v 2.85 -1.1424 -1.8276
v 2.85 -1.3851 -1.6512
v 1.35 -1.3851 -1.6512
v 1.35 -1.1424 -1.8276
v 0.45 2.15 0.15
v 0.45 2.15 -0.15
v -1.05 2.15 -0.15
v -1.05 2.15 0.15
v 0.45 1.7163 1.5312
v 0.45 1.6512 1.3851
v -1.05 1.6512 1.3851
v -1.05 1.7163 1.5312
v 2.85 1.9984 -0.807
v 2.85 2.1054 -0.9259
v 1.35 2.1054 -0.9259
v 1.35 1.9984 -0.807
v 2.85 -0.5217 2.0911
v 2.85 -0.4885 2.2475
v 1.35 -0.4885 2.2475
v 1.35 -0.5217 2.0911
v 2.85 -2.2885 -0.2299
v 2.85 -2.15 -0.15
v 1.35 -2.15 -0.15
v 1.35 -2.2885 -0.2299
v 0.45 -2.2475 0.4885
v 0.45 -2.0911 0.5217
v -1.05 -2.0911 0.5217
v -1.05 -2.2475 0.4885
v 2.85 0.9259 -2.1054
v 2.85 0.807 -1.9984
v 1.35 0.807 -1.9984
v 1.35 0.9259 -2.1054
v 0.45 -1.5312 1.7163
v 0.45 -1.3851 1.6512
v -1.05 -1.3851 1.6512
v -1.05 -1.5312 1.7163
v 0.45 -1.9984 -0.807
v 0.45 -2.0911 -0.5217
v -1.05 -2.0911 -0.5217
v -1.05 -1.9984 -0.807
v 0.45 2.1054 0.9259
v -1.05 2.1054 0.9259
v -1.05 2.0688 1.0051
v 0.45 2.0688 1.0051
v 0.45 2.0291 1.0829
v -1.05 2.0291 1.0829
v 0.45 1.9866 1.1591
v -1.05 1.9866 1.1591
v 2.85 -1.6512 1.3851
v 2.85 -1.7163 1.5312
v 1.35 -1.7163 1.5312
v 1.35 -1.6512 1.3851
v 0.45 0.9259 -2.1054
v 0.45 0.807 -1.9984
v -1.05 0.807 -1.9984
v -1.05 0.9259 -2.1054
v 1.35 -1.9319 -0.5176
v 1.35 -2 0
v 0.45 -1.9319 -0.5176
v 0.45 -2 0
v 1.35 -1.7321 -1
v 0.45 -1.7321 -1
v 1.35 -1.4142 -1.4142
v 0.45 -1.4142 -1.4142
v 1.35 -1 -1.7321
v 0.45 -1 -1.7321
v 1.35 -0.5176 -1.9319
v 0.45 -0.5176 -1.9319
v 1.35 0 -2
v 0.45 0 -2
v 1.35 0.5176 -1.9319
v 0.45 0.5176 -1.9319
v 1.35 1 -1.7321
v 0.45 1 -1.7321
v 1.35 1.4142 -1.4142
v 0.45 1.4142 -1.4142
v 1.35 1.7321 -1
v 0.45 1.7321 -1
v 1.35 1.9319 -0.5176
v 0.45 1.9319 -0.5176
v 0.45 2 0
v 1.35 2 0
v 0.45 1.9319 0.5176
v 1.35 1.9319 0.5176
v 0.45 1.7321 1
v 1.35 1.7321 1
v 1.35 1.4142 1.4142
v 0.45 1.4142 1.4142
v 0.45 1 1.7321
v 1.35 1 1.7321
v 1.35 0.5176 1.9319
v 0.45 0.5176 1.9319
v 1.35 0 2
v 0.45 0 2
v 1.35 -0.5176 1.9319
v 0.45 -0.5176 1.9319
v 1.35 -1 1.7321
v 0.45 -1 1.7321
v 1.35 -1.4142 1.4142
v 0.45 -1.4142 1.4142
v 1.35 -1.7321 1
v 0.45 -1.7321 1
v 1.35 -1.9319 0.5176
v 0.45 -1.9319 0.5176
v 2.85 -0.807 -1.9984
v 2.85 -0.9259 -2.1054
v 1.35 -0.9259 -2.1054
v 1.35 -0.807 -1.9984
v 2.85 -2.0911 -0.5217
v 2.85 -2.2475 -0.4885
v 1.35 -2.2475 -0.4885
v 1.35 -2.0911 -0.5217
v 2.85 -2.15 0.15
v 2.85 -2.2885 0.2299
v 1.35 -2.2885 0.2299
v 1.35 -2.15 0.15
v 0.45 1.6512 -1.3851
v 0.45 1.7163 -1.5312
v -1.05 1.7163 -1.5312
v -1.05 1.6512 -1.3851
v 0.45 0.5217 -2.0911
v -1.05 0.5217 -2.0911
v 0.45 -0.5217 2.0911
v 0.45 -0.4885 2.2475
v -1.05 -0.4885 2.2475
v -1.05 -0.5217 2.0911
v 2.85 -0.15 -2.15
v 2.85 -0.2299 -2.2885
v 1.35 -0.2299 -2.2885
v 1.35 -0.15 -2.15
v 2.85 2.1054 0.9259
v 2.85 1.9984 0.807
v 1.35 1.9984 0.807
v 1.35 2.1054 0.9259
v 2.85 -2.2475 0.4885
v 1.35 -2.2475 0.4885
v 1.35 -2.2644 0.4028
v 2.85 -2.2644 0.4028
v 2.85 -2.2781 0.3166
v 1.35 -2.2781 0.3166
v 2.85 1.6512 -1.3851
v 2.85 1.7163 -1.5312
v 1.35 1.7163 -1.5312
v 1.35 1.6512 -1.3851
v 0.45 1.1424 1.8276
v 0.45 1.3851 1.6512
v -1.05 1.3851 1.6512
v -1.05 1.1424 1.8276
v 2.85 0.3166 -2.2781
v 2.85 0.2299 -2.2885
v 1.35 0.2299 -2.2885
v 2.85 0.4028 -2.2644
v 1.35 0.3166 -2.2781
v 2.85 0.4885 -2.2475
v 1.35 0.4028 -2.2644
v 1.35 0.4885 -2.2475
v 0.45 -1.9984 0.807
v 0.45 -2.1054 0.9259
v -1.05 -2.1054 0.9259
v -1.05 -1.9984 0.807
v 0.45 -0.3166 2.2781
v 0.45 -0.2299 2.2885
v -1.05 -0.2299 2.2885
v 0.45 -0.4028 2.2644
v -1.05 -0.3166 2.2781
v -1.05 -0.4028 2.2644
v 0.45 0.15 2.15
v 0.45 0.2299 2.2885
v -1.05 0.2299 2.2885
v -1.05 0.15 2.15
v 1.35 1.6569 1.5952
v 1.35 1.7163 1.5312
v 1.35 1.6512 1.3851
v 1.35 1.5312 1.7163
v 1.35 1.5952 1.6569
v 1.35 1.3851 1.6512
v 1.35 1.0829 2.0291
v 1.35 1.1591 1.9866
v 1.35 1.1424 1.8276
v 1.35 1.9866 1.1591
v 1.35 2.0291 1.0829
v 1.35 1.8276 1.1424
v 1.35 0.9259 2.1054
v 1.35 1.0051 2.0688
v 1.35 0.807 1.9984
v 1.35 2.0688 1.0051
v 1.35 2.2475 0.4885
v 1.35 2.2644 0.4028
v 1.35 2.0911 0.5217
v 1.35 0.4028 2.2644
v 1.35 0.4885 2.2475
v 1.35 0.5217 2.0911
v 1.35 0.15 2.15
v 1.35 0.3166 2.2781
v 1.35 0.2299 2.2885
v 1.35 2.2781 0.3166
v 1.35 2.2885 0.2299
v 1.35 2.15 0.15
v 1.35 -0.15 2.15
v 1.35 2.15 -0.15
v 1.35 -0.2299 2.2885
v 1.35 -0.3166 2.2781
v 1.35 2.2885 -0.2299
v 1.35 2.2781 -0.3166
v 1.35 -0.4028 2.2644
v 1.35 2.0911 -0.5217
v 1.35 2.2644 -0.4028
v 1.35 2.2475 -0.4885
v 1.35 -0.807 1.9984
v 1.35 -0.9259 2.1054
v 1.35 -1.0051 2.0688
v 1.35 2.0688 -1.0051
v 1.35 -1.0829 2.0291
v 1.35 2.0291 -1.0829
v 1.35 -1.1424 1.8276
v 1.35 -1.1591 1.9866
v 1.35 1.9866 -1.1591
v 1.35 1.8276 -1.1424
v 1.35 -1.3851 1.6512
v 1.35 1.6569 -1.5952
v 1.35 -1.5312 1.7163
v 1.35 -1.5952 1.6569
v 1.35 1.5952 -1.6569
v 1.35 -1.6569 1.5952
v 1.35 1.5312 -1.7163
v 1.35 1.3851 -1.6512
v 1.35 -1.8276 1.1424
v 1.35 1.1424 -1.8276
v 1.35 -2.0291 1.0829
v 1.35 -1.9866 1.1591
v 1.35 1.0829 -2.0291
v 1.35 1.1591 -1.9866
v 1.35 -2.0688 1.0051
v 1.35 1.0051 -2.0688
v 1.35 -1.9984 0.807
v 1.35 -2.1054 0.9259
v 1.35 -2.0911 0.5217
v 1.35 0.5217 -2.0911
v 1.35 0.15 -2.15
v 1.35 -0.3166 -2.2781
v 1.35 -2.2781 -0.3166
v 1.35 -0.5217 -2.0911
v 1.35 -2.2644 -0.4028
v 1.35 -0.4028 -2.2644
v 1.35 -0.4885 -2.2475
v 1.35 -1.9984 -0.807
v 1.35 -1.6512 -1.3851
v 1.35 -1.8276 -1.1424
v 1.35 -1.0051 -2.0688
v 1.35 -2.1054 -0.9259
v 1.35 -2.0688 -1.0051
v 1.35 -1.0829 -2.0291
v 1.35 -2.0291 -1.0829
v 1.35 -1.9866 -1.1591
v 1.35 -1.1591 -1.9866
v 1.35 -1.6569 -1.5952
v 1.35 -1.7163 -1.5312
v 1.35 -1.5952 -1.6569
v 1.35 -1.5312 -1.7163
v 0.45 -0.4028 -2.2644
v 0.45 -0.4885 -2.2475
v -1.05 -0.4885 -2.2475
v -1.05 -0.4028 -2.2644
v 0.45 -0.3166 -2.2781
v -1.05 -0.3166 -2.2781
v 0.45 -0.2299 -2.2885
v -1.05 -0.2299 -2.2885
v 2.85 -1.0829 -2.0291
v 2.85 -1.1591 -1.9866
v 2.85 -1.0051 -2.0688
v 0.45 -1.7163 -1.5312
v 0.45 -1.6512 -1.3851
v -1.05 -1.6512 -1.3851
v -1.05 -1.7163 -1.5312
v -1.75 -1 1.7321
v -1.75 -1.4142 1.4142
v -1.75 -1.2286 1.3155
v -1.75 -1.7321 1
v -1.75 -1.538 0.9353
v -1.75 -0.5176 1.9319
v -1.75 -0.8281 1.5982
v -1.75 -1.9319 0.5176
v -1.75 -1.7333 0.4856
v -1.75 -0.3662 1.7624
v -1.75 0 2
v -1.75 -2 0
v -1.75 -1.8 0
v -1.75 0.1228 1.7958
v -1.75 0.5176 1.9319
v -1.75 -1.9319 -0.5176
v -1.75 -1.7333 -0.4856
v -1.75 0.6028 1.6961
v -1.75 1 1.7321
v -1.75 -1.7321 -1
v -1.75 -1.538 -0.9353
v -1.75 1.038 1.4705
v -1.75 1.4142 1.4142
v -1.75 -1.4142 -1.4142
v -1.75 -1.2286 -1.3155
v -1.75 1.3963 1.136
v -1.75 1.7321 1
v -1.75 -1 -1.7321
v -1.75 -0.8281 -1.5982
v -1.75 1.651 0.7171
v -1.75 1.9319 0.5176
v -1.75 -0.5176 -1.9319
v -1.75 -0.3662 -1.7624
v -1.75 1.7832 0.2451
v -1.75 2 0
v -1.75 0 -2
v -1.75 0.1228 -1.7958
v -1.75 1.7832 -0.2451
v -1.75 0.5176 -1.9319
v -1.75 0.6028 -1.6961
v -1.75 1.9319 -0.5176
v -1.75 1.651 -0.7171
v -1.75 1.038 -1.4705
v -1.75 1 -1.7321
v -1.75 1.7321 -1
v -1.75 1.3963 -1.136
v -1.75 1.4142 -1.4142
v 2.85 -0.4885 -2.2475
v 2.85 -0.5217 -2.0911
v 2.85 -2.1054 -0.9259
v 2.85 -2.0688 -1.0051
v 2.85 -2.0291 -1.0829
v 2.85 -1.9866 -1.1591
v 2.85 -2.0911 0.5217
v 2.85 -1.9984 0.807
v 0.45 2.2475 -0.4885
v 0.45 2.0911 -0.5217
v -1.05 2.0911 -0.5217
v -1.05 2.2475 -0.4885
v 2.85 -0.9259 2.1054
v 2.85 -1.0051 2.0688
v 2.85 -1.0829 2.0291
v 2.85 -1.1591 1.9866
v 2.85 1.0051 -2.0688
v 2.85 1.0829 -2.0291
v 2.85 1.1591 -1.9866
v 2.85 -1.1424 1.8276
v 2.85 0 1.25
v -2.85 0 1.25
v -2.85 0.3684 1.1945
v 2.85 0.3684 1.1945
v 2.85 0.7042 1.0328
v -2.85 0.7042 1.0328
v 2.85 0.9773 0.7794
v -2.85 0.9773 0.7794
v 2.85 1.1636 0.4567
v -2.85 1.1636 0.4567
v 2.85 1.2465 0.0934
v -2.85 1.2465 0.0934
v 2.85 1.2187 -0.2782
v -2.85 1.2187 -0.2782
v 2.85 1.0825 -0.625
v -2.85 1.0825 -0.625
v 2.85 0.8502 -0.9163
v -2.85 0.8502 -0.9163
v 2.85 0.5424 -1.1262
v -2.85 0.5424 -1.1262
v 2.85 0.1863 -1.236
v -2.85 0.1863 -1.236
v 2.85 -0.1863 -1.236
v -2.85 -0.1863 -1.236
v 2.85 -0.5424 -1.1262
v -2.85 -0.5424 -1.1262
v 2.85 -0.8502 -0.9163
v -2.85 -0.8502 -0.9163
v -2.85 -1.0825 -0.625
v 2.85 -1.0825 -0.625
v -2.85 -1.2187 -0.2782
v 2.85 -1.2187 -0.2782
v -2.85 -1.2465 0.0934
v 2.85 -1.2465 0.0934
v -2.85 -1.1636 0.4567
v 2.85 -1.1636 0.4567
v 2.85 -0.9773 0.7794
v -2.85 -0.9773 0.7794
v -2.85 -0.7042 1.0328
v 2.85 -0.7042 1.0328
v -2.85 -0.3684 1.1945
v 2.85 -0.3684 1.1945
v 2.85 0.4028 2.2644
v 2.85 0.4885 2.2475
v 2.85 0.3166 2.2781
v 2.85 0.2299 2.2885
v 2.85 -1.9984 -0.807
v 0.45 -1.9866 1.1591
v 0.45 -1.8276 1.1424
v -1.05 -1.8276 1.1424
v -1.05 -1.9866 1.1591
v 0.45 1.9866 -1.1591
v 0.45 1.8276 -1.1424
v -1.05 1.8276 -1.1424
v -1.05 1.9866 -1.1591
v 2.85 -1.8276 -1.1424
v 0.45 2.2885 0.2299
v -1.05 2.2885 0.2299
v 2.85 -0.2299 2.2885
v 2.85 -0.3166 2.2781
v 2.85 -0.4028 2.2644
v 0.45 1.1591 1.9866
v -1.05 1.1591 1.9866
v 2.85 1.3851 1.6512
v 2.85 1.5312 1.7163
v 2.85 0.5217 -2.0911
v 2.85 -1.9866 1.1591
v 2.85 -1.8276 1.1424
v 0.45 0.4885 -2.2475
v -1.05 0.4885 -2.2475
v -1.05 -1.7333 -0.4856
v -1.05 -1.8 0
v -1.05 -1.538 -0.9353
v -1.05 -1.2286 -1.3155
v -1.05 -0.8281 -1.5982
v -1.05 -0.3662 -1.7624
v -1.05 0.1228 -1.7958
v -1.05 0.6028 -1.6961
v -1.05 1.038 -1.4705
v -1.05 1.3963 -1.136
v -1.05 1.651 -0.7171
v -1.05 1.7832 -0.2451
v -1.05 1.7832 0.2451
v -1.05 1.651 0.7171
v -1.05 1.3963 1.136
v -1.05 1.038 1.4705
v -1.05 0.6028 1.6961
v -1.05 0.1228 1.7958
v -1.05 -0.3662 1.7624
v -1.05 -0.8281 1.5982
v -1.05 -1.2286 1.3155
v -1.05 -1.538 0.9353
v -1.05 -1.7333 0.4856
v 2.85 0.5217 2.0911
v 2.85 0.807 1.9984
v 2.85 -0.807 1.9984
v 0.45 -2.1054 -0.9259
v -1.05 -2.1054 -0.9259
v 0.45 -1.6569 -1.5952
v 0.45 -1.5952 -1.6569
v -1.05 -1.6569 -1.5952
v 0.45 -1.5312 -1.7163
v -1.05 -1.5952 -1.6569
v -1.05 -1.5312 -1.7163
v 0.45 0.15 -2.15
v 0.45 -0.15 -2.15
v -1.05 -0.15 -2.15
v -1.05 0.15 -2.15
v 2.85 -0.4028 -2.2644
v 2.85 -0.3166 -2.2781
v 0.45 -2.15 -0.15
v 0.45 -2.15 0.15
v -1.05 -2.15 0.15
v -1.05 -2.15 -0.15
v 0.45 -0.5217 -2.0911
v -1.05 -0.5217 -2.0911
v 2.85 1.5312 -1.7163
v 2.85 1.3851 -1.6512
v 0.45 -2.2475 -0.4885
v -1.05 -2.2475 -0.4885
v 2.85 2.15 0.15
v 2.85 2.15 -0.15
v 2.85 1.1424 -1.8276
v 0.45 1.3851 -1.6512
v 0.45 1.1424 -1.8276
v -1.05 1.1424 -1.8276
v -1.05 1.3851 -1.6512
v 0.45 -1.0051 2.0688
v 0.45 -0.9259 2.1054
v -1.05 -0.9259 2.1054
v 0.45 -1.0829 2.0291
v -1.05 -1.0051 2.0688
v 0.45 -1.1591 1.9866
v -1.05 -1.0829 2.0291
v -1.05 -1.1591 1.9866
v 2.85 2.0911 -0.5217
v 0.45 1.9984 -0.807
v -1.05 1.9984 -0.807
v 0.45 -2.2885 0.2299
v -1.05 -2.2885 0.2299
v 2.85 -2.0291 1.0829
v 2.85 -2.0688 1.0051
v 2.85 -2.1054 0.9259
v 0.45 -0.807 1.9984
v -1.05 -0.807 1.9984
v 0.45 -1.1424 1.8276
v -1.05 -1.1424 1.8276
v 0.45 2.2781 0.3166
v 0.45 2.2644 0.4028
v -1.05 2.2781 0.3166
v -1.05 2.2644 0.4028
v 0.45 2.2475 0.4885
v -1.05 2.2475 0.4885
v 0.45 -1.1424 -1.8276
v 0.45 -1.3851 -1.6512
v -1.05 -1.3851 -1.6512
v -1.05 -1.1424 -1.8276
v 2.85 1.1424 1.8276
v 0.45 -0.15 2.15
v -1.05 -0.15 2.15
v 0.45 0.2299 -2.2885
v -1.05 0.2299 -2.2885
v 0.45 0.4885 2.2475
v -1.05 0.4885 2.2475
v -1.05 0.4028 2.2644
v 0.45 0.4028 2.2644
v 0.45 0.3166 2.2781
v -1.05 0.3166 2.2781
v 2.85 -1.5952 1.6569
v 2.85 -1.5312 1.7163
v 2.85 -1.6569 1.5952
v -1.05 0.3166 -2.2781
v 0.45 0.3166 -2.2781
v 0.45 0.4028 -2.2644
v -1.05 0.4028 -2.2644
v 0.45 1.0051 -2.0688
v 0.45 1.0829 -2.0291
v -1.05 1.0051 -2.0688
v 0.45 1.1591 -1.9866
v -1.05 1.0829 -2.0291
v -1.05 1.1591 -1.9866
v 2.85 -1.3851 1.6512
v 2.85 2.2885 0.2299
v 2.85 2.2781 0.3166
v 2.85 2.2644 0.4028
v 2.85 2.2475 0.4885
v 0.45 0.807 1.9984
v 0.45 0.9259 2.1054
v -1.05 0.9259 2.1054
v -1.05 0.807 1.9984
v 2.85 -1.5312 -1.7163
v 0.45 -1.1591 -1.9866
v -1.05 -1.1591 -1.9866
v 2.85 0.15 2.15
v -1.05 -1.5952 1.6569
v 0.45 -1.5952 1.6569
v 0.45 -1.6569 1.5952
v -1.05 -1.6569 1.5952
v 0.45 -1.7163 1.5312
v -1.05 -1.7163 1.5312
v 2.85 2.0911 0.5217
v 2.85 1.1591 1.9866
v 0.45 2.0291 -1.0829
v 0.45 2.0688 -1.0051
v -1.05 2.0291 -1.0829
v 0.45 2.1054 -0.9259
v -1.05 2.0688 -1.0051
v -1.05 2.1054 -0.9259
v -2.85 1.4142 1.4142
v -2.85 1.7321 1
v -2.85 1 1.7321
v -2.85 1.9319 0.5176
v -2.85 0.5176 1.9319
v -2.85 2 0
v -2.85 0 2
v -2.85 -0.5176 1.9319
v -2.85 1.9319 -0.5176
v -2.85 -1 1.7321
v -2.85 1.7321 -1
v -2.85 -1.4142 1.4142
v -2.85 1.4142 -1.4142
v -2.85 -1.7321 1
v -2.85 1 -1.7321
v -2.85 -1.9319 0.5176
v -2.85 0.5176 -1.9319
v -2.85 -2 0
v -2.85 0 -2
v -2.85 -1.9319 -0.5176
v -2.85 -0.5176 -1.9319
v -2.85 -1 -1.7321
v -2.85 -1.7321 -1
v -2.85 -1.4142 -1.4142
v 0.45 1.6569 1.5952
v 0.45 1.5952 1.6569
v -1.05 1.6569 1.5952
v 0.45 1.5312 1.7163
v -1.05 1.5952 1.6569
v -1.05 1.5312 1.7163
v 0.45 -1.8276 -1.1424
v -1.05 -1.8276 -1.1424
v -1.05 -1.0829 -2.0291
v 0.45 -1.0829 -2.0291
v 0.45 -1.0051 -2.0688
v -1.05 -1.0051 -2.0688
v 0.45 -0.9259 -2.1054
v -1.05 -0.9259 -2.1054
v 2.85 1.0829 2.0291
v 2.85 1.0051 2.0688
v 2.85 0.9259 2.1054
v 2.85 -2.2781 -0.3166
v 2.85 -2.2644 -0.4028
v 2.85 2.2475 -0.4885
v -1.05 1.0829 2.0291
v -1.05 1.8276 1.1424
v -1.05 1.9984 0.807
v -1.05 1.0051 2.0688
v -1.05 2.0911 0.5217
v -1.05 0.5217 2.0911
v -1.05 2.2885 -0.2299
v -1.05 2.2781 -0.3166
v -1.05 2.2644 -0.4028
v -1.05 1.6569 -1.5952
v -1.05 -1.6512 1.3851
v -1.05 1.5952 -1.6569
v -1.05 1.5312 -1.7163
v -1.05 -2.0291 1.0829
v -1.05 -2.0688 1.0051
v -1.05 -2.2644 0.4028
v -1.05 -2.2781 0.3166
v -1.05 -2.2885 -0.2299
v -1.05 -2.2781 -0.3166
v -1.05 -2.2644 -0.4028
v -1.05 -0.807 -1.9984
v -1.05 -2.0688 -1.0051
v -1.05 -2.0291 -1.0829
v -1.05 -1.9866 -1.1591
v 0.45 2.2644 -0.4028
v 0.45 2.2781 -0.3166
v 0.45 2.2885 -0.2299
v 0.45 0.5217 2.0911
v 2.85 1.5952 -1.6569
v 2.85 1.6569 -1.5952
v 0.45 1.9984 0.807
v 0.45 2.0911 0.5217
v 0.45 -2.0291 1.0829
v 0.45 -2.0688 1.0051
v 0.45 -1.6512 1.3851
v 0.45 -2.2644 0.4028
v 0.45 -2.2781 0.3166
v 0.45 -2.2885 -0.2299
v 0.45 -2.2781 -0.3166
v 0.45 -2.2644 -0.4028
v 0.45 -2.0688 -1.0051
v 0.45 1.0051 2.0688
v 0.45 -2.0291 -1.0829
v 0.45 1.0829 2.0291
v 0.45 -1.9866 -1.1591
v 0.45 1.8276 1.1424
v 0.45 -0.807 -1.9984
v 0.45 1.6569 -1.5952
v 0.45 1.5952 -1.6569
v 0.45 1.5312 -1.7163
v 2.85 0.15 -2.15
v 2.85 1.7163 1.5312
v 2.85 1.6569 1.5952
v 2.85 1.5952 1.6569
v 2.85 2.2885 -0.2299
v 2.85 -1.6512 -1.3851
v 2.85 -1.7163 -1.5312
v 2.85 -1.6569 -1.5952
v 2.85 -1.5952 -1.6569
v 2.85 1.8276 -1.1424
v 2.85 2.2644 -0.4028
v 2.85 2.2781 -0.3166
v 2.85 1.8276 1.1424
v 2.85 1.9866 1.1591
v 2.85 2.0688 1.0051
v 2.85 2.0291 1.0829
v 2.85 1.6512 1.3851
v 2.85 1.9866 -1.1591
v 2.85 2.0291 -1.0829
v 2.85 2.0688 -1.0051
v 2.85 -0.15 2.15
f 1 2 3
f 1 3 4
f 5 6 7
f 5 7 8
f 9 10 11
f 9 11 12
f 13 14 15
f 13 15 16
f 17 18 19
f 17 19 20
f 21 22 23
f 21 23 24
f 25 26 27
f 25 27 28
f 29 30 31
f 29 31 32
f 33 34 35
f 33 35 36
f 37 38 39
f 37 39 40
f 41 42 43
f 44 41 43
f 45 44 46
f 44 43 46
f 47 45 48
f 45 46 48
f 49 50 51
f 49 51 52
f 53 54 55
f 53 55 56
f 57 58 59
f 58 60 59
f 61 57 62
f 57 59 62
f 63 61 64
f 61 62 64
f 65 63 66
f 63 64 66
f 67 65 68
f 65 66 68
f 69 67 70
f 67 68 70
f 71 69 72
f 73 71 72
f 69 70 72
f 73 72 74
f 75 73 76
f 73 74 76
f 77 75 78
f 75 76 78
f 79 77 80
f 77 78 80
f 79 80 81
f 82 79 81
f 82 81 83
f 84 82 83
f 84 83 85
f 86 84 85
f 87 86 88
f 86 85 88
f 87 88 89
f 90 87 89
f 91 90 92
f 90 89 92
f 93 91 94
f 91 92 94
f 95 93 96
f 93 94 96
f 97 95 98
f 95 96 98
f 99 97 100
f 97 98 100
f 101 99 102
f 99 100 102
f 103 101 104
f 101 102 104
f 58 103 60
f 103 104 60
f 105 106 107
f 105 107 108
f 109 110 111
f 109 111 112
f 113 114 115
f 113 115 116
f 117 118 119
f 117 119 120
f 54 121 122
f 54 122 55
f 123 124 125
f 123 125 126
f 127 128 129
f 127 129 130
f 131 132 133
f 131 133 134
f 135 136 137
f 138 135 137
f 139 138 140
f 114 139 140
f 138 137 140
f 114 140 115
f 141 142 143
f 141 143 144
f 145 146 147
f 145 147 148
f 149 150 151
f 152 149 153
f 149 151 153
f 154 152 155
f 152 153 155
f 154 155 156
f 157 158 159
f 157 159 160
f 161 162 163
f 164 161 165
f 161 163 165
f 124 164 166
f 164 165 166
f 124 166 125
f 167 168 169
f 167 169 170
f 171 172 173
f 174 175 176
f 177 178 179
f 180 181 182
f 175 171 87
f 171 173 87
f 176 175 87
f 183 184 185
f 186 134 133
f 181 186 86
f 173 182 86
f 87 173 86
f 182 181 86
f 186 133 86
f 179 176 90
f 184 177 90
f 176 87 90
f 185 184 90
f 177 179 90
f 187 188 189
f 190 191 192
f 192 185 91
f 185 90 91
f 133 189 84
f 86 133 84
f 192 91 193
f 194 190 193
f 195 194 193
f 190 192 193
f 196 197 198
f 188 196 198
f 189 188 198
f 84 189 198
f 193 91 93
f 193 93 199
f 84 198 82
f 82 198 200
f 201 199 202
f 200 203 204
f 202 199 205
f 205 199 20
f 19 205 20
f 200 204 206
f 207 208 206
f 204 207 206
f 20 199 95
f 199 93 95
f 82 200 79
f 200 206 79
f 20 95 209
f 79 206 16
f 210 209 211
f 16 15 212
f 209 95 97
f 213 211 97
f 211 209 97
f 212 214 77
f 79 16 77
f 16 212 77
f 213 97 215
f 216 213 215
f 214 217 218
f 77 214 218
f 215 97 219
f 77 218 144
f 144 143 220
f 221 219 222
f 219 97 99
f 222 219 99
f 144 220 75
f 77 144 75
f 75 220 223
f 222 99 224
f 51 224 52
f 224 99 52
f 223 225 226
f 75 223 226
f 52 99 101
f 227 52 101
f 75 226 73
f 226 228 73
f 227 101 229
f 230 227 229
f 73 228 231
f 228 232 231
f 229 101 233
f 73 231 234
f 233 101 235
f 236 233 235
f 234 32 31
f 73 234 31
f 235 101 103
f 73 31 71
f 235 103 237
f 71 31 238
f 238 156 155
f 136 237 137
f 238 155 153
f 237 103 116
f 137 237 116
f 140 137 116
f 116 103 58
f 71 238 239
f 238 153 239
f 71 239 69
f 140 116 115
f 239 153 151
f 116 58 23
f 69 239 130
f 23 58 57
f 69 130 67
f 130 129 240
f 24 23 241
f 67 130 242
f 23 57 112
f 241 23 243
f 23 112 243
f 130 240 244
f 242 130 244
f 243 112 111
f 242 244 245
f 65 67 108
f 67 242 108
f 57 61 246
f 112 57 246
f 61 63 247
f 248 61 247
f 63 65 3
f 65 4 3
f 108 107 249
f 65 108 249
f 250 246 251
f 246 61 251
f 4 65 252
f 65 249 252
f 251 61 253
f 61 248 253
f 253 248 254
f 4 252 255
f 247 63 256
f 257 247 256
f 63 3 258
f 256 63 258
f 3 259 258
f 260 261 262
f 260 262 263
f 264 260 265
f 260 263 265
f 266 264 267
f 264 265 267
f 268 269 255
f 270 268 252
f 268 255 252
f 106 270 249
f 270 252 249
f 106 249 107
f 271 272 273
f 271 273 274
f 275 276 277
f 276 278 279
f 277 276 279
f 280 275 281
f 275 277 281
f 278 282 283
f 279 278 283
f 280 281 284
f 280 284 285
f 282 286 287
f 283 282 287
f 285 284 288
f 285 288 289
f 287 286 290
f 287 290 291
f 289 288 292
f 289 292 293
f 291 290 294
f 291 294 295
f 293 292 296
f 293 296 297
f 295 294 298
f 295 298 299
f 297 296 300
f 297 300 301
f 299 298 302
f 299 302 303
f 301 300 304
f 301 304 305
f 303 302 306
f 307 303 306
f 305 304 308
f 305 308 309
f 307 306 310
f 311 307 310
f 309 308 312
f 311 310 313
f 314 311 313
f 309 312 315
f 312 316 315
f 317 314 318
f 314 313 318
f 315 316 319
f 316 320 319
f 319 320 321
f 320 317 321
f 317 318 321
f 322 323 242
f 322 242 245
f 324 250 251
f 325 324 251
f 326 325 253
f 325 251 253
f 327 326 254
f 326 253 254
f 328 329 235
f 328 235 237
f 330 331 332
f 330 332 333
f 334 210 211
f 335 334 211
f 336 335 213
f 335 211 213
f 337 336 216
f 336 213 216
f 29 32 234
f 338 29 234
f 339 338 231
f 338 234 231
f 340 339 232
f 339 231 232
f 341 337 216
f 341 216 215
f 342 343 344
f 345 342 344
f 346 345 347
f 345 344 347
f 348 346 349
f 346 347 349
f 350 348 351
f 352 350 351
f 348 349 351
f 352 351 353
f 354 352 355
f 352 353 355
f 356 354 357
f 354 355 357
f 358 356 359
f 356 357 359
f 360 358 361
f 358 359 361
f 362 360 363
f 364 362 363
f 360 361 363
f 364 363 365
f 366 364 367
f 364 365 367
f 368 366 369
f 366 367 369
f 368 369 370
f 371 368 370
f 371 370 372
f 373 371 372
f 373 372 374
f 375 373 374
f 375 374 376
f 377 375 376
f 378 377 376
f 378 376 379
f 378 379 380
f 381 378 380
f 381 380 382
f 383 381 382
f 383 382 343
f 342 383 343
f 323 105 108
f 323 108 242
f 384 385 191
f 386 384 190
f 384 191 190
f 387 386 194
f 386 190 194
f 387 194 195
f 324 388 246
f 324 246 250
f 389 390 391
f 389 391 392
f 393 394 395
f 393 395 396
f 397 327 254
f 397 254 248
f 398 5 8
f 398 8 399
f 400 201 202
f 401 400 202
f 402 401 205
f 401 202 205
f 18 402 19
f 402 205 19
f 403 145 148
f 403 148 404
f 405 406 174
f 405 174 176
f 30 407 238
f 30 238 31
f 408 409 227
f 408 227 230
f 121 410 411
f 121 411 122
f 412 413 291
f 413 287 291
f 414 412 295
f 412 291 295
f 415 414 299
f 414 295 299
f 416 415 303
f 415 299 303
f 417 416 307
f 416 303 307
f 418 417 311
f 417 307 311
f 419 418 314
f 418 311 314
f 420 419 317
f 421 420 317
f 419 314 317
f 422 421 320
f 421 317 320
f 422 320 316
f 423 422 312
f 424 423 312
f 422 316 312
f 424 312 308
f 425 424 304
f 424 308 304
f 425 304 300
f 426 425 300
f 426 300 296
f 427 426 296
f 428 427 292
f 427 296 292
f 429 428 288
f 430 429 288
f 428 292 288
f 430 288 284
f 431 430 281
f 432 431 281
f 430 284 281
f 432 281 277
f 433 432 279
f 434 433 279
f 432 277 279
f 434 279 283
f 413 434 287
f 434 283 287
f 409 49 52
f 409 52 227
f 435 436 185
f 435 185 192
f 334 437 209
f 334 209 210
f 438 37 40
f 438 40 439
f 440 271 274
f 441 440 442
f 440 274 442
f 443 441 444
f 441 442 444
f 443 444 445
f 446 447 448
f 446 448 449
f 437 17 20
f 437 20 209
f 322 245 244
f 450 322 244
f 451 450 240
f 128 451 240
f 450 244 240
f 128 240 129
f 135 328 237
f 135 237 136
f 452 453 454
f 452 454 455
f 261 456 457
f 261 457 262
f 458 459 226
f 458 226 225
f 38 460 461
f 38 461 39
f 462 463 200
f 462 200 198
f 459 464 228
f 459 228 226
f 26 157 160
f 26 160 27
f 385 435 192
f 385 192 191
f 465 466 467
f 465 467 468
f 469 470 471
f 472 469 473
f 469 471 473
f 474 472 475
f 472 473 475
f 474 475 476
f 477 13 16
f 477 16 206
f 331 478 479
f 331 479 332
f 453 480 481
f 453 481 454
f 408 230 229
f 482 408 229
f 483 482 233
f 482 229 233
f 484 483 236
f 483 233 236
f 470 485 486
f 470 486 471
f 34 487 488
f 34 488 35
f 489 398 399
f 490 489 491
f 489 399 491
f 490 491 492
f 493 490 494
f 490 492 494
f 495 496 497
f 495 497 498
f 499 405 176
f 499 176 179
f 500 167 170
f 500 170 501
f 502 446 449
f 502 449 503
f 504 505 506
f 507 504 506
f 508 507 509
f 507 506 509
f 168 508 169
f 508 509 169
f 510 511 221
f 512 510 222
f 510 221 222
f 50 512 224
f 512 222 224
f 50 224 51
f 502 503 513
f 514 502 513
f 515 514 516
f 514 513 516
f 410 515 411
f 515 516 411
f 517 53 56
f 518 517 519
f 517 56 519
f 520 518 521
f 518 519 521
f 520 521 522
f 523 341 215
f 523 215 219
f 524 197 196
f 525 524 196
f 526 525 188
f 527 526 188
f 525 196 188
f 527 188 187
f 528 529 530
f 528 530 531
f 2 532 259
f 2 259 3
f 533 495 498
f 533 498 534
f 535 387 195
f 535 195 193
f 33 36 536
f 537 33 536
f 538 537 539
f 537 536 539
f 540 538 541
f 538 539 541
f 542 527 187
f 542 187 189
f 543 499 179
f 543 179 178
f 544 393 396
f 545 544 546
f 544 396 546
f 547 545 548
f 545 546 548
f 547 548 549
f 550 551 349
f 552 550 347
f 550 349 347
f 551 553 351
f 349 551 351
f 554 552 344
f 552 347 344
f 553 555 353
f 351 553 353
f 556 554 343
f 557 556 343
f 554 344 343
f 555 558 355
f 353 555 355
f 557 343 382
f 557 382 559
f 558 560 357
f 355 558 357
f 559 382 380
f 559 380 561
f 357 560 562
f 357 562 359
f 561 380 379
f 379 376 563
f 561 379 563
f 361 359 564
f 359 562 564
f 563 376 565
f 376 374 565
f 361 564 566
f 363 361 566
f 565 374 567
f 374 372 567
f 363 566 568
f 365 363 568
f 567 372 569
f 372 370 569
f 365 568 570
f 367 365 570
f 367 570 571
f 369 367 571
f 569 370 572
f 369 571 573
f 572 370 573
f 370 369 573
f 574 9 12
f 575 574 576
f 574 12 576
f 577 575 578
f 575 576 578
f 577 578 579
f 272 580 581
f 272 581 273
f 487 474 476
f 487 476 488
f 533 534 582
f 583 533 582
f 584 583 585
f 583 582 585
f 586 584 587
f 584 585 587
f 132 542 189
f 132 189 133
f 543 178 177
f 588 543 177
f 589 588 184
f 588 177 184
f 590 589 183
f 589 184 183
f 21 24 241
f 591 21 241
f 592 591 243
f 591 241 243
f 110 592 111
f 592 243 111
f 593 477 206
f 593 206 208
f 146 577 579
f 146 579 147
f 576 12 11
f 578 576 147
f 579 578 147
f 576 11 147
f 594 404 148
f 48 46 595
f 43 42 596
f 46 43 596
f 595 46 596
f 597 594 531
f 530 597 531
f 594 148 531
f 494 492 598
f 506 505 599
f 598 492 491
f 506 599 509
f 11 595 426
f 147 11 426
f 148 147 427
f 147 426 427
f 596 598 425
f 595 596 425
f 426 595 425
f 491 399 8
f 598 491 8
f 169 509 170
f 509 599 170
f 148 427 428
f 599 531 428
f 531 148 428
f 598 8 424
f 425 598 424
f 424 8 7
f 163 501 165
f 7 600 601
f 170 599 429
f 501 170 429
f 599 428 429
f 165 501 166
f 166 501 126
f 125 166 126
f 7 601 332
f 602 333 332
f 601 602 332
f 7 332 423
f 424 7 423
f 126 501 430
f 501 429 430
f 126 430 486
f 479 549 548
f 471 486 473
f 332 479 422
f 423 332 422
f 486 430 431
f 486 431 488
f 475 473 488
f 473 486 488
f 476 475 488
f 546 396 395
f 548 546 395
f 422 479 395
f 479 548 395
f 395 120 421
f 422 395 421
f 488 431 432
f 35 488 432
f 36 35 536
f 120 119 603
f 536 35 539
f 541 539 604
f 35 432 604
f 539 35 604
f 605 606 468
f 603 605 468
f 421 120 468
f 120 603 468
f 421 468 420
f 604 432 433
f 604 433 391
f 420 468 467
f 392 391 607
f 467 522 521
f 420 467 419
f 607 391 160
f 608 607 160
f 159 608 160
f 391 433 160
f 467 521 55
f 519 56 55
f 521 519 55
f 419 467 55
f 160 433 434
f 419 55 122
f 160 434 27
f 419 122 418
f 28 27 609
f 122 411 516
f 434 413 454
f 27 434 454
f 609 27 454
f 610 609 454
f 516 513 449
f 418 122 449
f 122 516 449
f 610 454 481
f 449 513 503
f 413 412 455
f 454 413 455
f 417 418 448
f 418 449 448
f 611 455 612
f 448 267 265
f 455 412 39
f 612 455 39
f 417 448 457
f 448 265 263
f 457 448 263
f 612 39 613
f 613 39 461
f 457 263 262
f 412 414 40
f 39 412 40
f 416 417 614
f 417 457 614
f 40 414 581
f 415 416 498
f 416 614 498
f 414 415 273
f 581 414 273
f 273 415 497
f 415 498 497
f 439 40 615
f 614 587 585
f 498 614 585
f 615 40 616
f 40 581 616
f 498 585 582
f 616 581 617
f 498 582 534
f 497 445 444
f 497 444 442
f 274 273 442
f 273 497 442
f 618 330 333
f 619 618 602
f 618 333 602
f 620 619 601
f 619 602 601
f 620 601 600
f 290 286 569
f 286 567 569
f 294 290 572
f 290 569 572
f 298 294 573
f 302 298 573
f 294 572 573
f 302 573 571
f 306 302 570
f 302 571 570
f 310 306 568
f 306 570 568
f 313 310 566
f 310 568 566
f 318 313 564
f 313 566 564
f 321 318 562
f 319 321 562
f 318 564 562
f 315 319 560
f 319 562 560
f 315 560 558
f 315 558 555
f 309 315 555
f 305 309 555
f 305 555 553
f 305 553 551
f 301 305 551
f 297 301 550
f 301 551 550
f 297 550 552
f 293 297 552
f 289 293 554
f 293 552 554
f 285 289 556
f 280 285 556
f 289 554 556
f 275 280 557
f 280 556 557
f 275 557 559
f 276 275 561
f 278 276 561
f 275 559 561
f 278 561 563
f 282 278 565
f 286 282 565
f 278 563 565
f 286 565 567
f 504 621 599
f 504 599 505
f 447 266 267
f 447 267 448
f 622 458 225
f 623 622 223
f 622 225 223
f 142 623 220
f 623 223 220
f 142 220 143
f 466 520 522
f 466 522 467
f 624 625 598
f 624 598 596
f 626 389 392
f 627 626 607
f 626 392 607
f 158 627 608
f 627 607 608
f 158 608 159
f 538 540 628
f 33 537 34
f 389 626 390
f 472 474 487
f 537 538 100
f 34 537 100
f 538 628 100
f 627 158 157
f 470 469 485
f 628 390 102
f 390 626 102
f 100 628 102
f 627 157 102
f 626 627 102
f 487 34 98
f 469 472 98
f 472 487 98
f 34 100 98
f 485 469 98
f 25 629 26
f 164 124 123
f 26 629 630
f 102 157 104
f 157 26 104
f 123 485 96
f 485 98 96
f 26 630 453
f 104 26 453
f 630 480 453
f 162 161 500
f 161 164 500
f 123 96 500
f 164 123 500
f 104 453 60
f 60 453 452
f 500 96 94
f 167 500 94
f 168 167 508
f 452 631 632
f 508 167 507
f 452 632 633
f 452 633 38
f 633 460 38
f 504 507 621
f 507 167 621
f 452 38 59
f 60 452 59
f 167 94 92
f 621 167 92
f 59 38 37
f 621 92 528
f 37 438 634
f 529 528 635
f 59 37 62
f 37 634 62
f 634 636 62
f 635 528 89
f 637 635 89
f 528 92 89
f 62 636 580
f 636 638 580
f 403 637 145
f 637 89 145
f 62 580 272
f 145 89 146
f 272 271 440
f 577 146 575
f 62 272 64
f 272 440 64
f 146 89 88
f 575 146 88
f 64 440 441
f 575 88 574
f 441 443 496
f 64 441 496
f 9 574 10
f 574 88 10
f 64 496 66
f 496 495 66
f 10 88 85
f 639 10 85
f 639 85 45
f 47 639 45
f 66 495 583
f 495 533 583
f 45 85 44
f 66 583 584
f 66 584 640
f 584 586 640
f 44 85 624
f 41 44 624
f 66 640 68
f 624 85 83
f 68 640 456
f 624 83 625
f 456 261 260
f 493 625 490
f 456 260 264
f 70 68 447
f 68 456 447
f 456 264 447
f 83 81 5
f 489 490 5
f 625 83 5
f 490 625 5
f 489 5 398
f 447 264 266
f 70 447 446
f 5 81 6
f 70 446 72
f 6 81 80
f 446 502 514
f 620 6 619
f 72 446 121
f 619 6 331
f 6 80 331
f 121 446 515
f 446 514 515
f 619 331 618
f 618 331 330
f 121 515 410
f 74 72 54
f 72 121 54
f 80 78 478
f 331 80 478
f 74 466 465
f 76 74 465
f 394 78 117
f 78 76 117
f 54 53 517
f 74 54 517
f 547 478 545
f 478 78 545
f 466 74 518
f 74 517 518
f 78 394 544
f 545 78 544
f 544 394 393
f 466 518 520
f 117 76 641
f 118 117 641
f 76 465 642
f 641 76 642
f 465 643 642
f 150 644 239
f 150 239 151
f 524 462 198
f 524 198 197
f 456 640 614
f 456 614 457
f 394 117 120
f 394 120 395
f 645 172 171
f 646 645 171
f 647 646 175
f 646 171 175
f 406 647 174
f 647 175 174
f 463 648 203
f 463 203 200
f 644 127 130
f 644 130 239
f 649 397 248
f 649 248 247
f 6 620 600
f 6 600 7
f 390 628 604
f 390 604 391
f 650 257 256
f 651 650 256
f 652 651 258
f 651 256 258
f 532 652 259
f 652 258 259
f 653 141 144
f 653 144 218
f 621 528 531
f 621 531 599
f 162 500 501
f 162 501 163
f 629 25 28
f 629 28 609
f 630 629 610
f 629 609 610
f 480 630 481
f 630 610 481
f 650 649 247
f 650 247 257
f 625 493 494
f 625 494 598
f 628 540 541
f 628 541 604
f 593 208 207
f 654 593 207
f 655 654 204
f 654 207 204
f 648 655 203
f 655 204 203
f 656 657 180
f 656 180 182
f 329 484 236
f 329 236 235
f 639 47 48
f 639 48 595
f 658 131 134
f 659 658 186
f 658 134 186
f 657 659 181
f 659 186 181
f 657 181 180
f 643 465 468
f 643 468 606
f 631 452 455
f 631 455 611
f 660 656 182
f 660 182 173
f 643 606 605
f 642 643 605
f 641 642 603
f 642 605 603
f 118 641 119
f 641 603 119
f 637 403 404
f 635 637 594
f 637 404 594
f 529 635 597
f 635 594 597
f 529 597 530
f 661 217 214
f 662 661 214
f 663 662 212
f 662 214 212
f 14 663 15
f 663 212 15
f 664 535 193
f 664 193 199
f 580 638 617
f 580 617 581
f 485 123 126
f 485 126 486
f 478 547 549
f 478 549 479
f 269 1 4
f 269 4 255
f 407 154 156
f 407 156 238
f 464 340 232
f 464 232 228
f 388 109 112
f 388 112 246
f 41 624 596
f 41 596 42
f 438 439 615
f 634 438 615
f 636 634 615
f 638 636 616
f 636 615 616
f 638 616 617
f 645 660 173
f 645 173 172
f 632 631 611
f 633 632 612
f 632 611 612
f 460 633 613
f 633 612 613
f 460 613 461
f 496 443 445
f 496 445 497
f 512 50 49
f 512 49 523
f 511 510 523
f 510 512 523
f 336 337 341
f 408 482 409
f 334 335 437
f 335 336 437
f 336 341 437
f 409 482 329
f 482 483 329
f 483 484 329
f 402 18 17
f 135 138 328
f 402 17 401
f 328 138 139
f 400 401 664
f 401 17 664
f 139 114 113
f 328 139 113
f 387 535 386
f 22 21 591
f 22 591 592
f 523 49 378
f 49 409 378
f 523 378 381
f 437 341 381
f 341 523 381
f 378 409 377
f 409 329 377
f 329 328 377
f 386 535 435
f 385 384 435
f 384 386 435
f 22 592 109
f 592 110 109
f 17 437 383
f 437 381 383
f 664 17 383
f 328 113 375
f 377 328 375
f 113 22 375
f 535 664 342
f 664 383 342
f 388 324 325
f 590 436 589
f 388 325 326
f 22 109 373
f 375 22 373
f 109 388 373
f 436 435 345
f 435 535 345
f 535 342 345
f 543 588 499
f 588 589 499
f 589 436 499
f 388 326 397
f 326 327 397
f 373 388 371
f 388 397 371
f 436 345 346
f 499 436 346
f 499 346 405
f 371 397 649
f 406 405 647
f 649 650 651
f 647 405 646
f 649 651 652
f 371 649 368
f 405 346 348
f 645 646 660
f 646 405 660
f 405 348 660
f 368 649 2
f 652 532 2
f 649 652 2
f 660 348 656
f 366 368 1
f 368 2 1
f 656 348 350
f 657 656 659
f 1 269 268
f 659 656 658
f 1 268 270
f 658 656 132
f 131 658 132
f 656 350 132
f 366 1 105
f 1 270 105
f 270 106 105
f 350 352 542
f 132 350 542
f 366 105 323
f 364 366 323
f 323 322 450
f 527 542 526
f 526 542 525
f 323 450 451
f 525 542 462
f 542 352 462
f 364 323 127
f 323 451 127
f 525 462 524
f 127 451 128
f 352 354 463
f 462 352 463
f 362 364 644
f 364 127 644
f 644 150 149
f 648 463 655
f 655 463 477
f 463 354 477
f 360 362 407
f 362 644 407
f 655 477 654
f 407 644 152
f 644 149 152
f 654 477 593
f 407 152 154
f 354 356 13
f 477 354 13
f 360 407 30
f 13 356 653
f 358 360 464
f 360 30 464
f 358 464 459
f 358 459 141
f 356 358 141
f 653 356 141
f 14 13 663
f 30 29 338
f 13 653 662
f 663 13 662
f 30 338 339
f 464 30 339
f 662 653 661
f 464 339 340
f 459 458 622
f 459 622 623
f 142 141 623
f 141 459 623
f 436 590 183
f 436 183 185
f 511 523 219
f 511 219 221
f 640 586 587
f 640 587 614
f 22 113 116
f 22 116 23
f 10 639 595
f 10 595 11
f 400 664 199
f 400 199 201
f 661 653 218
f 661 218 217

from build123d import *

# Parameters (mm, degrees)
M3X0_5_TAPPED_HOLE1_D = 2.5
CUT_EXTRUDE1_REACH    = 8.563
CIRPATTERN1_COUNT     = 20


with BuildPart() as part:
    # Sketch1 → Revolve1 (revolve)
    with BuildSketch(Plane.XY, mode=Mode.PRIVATE) as revolve1_sk:
        Polygon((-2.85, 0), (2.85, 0), (2.85, 2.3), (1.35, 2.3), (1.35, 2), (0.45, 2), (0.45, 2.3), (-1.05, 2.3), (-1.05, 1.8), (-1.75, 1.8), (-1.75, 2), (-2.85, 2), align=None)
    revolve(revolve1_sk.sketch.rotate(Axis((-2.85, 0, 0), (1, 0, 0)), 180), axis=Axis((-2.85, 0, 0), (1, 0, 0)))

    # M3x0.5 Tapped Hole1 (through all)
    with Locations(Plane(origin=(2.85, 0, 0), x_dir=(0, 0, -1), z_dir=(1, 0, 0))):
        with Locations((0, 0)):
            Hole(M3X0_5_TAPPED_HOLE1_D / 2)

    # Cut-Extrude1: up to this face of the body (flat: up to its plane)
    cut_extrude1_end = Plane(part.part.faces().sort_by_distance((-1.05, 2.234946176, 0))[0])
    # Sketch4 → Cut-Extrude1 (cut, up to the picked face)
    with BuildSketch(Plane(origin=(2.85, 0, 0), x_dir=(0, 0, -1), z_dir=(1, 0, 0)), mode=Mode.PRIVATE) as cut_extrude1_sk1:
        with BuildLine():
            Line((0.229949273, 2.288476203), (0.15, 2.15))
            Line((0.15, 2.15), (-0.15, 2.15))
            Line((-0.15, 2.15), (-0.229949273, 2.288476203))
            ThreePointArc((-0.229949273, 2.288476203), (0, 2.3), (0.229949273, 2.288476203))
        make_face()
    cut_extrude1_tool1 = split(extrude(cut_extrude1_sk1.sketch, amount=-CUT_EXTRUDE1_REACH, mode=Mode.PRIVATE), bisect_by=cut_extrude1_end, keep=Keep.BOTH, mode=Mode.PRIVATE)
    cut_extrude1 = cut_extrude1_tool1.solids().sort_by(Axis((2.85, 2.228438, 0), (-1, 0, 0)))[0]
    add(cut_extrude1, mode=Mode.SUBTRACT)

    # CirPattern1: Cut-Extrude1 ×20 about axis
    cirpattern1_axis = Axis((0, 0, 0), (1, 0, 0))
    for i in range(1, CIRPATTERN1_COUNT):
        add(cut_extrude1.rotate(cirpattern1_axis, i * 360 / CIRPATTERN1_COUNT), mode=Mode.SUBTRACT)


solid = part.part
